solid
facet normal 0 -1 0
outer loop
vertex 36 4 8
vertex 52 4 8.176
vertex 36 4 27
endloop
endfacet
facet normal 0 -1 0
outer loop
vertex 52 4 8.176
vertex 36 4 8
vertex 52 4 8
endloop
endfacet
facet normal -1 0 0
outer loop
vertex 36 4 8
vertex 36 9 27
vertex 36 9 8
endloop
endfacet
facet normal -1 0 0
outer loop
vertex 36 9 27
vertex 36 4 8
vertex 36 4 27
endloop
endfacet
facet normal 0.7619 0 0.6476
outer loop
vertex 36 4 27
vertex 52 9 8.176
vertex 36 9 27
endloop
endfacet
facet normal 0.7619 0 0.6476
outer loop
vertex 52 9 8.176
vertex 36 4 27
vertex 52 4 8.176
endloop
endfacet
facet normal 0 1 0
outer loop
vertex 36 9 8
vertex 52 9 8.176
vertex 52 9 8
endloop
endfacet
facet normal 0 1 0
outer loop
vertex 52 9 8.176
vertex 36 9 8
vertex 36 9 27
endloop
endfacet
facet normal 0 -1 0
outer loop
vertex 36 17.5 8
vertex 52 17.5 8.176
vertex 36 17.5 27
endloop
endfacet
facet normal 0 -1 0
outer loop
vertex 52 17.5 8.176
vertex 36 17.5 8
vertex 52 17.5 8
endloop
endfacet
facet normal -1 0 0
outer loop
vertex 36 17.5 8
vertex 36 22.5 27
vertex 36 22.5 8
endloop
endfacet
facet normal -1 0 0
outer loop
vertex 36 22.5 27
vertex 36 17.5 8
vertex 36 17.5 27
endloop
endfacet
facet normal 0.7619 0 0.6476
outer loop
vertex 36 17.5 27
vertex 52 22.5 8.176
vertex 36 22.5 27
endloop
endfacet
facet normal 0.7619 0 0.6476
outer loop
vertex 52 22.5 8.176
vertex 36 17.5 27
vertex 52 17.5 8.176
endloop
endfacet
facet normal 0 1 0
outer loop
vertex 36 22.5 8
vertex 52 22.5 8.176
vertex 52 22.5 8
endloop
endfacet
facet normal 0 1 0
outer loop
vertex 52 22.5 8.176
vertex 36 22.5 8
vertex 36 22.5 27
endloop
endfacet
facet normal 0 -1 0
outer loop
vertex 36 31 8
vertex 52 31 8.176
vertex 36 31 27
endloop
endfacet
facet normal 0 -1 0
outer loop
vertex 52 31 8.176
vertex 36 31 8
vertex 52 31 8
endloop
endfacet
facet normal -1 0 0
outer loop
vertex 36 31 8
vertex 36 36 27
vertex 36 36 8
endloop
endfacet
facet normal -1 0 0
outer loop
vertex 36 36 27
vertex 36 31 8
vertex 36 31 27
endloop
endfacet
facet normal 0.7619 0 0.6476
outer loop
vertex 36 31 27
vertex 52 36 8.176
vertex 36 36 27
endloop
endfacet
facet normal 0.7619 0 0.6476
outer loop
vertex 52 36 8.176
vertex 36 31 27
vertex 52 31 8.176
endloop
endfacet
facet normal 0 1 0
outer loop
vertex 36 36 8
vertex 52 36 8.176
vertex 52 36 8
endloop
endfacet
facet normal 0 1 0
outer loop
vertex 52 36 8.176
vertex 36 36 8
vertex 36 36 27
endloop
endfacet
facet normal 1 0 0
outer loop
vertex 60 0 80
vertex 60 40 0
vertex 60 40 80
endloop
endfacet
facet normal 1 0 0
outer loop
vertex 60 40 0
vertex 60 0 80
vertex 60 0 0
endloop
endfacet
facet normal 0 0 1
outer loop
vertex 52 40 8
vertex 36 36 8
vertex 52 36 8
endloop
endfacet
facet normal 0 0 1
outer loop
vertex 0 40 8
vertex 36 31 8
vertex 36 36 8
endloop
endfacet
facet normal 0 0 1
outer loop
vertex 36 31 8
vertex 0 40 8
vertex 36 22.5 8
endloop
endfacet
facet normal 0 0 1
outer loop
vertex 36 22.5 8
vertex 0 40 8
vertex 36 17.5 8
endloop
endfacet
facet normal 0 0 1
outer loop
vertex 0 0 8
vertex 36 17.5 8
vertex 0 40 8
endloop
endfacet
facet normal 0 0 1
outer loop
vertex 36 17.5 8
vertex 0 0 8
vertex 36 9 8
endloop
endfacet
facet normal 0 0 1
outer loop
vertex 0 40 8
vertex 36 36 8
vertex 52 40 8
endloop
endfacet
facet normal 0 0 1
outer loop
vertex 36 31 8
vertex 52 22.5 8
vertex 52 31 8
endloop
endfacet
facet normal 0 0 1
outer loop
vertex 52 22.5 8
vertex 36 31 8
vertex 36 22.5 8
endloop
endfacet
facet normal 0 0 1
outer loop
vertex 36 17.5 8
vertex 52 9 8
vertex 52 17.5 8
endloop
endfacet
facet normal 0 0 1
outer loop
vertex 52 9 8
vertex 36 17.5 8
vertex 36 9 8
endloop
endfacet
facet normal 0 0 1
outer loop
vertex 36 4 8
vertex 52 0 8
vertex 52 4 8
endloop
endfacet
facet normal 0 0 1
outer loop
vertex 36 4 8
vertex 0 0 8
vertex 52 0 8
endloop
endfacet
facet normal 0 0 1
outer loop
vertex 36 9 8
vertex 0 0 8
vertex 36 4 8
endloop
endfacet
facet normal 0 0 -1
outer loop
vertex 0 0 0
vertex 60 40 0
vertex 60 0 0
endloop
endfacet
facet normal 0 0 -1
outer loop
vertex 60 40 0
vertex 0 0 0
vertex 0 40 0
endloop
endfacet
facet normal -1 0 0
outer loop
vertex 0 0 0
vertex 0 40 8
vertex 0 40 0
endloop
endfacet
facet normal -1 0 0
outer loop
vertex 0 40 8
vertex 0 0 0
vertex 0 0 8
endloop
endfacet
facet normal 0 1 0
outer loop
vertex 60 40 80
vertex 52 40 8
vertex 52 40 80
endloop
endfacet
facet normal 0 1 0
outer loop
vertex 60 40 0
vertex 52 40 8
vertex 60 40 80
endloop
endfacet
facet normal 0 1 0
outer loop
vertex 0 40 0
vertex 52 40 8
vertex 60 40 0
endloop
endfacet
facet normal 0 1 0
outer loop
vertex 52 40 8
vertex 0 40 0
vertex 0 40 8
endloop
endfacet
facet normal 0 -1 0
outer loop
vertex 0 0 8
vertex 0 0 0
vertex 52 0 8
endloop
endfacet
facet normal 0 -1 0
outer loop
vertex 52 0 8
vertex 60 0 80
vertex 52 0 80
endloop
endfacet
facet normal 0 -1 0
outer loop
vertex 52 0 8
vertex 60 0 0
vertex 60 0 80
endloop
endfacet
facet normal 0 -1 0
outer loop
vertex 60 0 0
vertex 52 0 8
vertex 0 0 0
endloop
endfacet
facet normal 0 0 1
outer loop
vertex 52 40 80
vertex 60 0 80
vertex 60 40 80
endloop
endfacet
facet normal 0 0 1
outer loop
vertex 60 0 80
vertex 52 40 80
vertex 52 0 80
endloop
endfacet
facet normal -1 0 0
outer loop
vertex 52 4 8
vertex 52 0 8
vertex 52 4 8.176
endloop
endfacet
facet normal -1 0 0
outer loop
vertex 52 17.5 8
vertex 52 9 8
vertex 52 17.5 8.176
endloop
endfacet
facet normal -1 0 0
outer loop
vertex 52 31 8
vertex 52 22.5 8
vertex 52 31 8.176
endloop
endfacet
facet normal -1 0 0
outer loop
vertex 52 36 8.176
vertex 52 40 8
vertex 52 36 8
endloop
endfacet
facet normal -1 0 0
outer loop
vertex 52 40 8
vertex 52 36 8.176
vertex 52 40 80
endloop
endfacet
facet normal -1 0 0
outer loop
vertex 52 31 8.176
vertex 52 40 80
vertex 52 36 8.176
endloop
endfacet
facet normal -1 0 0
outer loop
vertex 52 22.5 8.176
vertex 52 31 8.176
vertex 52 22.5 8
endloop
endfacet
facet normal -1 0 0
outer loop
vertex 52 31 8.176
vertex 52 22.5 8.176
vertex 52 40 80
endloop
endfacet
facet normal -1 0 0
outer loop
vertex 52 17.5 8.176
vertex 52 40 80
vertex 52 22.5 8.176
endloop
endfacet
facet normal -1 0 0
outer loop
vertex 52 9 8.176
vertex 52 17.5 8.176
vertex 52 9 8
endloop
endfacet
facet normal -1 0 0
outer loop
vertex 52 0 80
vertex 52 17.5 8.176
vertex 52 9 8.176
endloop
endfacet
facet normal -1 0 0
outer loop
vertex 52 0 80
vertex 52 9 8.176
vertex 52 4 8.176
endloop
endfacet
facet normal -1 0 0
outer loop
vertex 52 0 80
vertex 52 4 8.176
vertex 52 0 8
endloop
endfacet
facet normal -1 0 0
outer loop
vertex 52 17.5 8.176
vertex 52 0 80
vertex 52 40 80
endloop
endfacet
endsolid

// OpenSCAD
$fn = 32;

// ----------------------------------------------------------------------
// Rib bracket: 3-gusset L bracket
// ----------------------------------------------------------------------

// --- parameters (mm) ---
base_l = 60;              // foot length, X
base_w = 40;              // foot width, Y
base_t = 8;               // foot thickness
plate_t = 8;              // upright plate thickness
plate_h = 80;             // overall height
gus_l = 16;               // gusset leg along the foot
gus_h = 20;               // gusset height
gus_t = 5;                // gusset thickness
gus_edge = 4;             // gusset margin from the foot edge
n_gus = 3;                // gusset count

gus_pitch = (base_w - 2 * gus_edge - gus_t) / (n_gus - 1);  // gusset pitch

union() {
  cube([base_l, base_w, base_t]);
  translate([base_l - plate_t, 0, base_t - 1])
    cube([plate_t, base_w, plate_h - base_t + 1]);
  for (i = [0 : n_gus - 1])
    translate([base_l - plate_t - gus_l, gus_edge + i * gus_pitch, base_t - 1])
      rotate([-90, 0, 0])
        linear_extrude(height = gus_t)
          polygon(points = [[0, 0], [gus_l + 1, 0], [0, -gus_h]]);
}
